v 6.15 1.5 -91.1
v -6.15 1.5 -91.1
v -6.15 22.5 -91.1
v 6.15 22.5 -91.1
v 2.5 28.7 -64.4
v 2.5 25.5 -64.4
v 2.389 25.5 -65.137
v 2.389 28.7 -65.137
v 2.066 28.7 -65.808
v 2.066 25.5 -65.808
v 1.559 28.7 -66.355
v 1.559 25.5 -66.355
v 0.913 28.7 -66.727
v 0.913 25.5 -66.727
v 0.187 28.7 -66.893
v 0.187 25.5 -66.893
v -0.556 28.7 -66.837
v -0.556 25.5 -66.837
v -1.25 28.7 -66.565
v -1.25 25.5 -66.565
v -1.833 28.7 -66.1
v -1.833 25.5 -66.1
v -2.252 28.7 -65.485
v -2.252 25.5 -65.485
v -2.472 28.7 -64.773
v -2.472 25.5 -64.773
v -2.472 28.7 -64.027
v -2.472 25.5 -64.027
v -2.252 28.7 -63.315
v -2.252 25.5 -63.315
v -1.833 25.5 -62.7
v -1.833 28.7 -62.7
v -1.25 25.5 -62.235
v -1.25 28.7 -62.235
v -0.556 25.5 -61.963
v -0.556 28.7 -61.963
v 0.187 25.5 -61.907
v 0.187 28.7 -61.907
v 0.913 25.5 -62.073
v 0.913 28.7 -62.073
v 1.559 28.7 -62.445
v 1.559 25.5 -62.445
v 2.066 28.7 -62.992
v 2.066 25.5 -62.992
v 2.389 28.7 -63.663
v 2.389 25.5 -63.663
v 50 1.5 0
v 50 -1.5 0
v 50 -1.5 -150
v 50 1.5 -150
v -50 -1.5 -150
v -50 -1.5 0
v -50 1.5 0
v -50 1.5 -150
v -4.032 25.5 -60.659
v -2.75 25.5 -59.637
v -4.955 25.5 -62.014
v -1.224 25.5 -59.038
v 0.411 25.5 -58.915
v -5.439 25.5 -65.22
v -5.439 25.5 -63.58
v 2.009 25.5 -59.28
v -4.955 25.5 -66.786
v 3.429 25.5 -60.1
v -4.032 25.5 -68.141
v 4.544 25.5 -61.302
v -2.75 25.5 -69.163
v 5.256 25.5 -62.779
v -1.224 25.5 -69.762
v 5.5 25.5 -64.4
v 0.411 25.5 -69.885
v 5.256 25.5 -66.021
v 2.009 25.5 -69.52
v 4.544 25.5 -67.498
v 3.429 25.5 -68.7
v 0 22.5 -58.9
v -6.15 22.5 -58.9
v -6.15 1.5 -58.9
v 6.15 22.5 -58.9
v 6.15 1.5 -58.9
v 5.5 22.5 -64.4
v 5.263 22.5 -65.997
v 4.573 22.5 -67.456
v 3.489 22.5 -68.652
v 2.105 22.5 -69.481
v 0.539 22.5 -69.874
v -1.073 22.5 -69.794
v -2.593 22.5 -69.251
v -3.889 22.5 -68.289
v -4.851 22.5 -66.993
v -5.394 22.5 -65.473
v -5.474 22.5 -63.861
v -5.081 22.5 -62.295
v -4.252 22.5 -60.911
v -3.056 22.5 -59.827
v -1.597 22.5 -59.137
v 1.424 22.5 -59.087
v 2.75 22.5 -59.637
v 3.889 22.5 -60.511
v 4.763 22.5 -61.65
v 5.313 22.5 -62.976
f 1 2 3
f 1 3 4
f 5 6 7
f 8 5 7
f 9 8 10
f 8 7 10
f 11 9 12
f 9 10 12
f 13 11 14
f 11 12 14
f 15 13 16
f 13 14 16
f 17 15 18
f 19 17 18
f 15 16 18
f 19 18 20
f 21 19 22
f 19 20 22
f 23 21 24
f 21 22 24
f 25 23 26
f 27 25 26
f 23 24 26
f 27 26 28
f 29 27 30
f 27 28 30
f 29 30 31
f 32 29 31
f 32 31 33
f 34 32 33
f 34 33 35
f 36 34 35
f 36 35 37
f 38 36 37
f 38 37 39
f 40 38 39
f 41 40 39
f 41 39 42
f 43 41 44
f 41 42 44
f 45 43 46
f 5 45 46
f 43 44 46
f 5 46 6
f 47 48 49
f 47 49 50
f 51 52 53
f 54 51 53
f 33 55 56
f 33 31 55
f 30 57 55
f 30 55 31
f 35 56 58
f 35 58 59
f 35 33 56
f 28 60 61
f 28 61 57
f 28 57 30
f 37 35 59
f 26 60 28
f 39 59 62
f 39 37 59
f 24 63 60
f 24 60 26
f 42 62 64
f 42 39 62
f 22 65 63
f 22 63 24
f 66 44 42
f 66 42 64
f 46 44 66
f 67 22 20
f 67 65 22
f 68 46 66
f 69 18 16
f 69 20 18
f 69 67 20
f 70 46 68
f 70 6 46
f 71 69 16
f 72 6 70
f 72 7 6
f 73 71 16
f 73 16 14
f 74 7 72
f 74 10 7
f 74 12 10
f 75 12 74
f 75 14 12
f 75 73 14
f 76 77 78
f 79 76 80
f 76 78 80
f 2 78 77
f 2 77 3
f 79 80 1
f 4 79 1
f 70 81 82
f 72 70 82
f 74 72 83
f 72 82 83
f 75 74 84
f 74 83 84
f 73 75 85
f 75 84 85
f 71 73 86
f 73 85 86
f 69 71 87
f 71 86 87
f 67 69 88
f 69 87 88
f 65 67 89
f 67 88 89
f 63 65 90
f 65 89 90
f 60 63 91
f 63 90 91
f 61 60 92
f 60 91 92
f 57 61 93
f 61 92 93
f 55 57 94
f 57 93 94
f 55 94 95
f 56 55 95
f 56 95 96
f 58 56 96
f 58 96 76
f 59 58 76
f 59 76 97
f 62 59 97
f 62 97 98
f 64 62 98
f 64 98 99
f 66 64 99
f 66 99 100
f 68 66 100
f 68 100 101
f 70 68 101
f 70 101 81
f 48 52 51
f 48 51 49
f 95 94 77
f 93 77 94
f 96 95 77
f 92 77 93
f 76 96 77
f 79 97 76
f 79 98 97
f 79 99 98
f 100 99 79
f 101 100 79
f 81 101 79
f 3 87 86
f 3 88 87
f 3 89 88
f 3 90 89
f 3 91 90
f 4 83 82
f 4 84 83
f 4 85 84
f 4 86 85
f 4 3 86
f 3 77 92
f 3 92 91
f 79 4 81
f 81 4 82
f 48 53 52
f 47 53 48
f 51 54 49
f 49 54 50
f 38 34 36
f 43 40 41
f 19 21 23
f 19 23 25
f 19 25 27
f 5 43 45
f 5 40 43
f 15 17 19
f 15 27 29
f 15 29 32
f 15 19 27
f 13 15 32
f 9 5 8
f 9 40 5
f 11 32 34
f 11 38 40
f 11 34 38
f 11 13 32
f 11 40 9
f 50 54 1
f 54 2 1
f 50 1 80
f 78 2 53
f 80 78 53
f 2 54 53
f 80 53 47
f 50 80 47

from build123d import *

# Parameters (mm, degrees)
SKETCH2_W           = 100
SKETCH2_H           = 3
BOSS_EXTRUDE2_DEPTH = 150
SKETCH3_W           = 12.3
SKETCH3_H           = 32.2
BOSS_EXTRUDE3_DEPTH = 22.5
SKETCH4_R           = 5.5
BOSS_EXTRUDE4_DEPTH = 3
SKETCH10_R          = 2.5
BOSS_EXTRUDE5_DEPTH = 3.2


with BuildPart() as part:
    # Sketch2 → Boss-Extrude2 (new body)
    with BuildSketch(Plane.XY):
        Rectangle(SKETCH2_W, SKETCH2_H)
    extrude(amount=-BOSS_EXTRUDE2_DEPTH)

    # Sketch3 → Boss-Extrude3 (add)
    with BuildSketch(Plane(origin=(0, 0, 0), x_dir=(1, 0, 0), z_dir=(0, 1, 0))):
        with Locations((0, 75)):
            Rectangle(SKETCH3_W, SKETCH3_H)
    extrude(amount=BOSS_EXTRUDE3_DEPTH)

    # Sketch4 → Boss-Extrude4 (add)
    with BuildSketch(Plane(origin=(0, 22.5, 0), x_dir=(1, 0, 0), z_dir=(0, 1, 0))):
        with Locations((0, 64.4)):
            Circle(SKETCH4_R)
    extrude(amount=BOSS_EXTRUDE4_DEPTH)

    # Sketch10 → Boss-Extrude5 (add)
    with BuildSketch(Plane(origin=(0, 25.5, 0), x_dir=(1, 0, 0), z_dir=(0, 1, 0))):
        with Locations((0, 64.4)):
            Circle(SKETCH10_R)
    extrude(amount=BOSS_EXTRUDE5_DEPTH)


solid = part.part
